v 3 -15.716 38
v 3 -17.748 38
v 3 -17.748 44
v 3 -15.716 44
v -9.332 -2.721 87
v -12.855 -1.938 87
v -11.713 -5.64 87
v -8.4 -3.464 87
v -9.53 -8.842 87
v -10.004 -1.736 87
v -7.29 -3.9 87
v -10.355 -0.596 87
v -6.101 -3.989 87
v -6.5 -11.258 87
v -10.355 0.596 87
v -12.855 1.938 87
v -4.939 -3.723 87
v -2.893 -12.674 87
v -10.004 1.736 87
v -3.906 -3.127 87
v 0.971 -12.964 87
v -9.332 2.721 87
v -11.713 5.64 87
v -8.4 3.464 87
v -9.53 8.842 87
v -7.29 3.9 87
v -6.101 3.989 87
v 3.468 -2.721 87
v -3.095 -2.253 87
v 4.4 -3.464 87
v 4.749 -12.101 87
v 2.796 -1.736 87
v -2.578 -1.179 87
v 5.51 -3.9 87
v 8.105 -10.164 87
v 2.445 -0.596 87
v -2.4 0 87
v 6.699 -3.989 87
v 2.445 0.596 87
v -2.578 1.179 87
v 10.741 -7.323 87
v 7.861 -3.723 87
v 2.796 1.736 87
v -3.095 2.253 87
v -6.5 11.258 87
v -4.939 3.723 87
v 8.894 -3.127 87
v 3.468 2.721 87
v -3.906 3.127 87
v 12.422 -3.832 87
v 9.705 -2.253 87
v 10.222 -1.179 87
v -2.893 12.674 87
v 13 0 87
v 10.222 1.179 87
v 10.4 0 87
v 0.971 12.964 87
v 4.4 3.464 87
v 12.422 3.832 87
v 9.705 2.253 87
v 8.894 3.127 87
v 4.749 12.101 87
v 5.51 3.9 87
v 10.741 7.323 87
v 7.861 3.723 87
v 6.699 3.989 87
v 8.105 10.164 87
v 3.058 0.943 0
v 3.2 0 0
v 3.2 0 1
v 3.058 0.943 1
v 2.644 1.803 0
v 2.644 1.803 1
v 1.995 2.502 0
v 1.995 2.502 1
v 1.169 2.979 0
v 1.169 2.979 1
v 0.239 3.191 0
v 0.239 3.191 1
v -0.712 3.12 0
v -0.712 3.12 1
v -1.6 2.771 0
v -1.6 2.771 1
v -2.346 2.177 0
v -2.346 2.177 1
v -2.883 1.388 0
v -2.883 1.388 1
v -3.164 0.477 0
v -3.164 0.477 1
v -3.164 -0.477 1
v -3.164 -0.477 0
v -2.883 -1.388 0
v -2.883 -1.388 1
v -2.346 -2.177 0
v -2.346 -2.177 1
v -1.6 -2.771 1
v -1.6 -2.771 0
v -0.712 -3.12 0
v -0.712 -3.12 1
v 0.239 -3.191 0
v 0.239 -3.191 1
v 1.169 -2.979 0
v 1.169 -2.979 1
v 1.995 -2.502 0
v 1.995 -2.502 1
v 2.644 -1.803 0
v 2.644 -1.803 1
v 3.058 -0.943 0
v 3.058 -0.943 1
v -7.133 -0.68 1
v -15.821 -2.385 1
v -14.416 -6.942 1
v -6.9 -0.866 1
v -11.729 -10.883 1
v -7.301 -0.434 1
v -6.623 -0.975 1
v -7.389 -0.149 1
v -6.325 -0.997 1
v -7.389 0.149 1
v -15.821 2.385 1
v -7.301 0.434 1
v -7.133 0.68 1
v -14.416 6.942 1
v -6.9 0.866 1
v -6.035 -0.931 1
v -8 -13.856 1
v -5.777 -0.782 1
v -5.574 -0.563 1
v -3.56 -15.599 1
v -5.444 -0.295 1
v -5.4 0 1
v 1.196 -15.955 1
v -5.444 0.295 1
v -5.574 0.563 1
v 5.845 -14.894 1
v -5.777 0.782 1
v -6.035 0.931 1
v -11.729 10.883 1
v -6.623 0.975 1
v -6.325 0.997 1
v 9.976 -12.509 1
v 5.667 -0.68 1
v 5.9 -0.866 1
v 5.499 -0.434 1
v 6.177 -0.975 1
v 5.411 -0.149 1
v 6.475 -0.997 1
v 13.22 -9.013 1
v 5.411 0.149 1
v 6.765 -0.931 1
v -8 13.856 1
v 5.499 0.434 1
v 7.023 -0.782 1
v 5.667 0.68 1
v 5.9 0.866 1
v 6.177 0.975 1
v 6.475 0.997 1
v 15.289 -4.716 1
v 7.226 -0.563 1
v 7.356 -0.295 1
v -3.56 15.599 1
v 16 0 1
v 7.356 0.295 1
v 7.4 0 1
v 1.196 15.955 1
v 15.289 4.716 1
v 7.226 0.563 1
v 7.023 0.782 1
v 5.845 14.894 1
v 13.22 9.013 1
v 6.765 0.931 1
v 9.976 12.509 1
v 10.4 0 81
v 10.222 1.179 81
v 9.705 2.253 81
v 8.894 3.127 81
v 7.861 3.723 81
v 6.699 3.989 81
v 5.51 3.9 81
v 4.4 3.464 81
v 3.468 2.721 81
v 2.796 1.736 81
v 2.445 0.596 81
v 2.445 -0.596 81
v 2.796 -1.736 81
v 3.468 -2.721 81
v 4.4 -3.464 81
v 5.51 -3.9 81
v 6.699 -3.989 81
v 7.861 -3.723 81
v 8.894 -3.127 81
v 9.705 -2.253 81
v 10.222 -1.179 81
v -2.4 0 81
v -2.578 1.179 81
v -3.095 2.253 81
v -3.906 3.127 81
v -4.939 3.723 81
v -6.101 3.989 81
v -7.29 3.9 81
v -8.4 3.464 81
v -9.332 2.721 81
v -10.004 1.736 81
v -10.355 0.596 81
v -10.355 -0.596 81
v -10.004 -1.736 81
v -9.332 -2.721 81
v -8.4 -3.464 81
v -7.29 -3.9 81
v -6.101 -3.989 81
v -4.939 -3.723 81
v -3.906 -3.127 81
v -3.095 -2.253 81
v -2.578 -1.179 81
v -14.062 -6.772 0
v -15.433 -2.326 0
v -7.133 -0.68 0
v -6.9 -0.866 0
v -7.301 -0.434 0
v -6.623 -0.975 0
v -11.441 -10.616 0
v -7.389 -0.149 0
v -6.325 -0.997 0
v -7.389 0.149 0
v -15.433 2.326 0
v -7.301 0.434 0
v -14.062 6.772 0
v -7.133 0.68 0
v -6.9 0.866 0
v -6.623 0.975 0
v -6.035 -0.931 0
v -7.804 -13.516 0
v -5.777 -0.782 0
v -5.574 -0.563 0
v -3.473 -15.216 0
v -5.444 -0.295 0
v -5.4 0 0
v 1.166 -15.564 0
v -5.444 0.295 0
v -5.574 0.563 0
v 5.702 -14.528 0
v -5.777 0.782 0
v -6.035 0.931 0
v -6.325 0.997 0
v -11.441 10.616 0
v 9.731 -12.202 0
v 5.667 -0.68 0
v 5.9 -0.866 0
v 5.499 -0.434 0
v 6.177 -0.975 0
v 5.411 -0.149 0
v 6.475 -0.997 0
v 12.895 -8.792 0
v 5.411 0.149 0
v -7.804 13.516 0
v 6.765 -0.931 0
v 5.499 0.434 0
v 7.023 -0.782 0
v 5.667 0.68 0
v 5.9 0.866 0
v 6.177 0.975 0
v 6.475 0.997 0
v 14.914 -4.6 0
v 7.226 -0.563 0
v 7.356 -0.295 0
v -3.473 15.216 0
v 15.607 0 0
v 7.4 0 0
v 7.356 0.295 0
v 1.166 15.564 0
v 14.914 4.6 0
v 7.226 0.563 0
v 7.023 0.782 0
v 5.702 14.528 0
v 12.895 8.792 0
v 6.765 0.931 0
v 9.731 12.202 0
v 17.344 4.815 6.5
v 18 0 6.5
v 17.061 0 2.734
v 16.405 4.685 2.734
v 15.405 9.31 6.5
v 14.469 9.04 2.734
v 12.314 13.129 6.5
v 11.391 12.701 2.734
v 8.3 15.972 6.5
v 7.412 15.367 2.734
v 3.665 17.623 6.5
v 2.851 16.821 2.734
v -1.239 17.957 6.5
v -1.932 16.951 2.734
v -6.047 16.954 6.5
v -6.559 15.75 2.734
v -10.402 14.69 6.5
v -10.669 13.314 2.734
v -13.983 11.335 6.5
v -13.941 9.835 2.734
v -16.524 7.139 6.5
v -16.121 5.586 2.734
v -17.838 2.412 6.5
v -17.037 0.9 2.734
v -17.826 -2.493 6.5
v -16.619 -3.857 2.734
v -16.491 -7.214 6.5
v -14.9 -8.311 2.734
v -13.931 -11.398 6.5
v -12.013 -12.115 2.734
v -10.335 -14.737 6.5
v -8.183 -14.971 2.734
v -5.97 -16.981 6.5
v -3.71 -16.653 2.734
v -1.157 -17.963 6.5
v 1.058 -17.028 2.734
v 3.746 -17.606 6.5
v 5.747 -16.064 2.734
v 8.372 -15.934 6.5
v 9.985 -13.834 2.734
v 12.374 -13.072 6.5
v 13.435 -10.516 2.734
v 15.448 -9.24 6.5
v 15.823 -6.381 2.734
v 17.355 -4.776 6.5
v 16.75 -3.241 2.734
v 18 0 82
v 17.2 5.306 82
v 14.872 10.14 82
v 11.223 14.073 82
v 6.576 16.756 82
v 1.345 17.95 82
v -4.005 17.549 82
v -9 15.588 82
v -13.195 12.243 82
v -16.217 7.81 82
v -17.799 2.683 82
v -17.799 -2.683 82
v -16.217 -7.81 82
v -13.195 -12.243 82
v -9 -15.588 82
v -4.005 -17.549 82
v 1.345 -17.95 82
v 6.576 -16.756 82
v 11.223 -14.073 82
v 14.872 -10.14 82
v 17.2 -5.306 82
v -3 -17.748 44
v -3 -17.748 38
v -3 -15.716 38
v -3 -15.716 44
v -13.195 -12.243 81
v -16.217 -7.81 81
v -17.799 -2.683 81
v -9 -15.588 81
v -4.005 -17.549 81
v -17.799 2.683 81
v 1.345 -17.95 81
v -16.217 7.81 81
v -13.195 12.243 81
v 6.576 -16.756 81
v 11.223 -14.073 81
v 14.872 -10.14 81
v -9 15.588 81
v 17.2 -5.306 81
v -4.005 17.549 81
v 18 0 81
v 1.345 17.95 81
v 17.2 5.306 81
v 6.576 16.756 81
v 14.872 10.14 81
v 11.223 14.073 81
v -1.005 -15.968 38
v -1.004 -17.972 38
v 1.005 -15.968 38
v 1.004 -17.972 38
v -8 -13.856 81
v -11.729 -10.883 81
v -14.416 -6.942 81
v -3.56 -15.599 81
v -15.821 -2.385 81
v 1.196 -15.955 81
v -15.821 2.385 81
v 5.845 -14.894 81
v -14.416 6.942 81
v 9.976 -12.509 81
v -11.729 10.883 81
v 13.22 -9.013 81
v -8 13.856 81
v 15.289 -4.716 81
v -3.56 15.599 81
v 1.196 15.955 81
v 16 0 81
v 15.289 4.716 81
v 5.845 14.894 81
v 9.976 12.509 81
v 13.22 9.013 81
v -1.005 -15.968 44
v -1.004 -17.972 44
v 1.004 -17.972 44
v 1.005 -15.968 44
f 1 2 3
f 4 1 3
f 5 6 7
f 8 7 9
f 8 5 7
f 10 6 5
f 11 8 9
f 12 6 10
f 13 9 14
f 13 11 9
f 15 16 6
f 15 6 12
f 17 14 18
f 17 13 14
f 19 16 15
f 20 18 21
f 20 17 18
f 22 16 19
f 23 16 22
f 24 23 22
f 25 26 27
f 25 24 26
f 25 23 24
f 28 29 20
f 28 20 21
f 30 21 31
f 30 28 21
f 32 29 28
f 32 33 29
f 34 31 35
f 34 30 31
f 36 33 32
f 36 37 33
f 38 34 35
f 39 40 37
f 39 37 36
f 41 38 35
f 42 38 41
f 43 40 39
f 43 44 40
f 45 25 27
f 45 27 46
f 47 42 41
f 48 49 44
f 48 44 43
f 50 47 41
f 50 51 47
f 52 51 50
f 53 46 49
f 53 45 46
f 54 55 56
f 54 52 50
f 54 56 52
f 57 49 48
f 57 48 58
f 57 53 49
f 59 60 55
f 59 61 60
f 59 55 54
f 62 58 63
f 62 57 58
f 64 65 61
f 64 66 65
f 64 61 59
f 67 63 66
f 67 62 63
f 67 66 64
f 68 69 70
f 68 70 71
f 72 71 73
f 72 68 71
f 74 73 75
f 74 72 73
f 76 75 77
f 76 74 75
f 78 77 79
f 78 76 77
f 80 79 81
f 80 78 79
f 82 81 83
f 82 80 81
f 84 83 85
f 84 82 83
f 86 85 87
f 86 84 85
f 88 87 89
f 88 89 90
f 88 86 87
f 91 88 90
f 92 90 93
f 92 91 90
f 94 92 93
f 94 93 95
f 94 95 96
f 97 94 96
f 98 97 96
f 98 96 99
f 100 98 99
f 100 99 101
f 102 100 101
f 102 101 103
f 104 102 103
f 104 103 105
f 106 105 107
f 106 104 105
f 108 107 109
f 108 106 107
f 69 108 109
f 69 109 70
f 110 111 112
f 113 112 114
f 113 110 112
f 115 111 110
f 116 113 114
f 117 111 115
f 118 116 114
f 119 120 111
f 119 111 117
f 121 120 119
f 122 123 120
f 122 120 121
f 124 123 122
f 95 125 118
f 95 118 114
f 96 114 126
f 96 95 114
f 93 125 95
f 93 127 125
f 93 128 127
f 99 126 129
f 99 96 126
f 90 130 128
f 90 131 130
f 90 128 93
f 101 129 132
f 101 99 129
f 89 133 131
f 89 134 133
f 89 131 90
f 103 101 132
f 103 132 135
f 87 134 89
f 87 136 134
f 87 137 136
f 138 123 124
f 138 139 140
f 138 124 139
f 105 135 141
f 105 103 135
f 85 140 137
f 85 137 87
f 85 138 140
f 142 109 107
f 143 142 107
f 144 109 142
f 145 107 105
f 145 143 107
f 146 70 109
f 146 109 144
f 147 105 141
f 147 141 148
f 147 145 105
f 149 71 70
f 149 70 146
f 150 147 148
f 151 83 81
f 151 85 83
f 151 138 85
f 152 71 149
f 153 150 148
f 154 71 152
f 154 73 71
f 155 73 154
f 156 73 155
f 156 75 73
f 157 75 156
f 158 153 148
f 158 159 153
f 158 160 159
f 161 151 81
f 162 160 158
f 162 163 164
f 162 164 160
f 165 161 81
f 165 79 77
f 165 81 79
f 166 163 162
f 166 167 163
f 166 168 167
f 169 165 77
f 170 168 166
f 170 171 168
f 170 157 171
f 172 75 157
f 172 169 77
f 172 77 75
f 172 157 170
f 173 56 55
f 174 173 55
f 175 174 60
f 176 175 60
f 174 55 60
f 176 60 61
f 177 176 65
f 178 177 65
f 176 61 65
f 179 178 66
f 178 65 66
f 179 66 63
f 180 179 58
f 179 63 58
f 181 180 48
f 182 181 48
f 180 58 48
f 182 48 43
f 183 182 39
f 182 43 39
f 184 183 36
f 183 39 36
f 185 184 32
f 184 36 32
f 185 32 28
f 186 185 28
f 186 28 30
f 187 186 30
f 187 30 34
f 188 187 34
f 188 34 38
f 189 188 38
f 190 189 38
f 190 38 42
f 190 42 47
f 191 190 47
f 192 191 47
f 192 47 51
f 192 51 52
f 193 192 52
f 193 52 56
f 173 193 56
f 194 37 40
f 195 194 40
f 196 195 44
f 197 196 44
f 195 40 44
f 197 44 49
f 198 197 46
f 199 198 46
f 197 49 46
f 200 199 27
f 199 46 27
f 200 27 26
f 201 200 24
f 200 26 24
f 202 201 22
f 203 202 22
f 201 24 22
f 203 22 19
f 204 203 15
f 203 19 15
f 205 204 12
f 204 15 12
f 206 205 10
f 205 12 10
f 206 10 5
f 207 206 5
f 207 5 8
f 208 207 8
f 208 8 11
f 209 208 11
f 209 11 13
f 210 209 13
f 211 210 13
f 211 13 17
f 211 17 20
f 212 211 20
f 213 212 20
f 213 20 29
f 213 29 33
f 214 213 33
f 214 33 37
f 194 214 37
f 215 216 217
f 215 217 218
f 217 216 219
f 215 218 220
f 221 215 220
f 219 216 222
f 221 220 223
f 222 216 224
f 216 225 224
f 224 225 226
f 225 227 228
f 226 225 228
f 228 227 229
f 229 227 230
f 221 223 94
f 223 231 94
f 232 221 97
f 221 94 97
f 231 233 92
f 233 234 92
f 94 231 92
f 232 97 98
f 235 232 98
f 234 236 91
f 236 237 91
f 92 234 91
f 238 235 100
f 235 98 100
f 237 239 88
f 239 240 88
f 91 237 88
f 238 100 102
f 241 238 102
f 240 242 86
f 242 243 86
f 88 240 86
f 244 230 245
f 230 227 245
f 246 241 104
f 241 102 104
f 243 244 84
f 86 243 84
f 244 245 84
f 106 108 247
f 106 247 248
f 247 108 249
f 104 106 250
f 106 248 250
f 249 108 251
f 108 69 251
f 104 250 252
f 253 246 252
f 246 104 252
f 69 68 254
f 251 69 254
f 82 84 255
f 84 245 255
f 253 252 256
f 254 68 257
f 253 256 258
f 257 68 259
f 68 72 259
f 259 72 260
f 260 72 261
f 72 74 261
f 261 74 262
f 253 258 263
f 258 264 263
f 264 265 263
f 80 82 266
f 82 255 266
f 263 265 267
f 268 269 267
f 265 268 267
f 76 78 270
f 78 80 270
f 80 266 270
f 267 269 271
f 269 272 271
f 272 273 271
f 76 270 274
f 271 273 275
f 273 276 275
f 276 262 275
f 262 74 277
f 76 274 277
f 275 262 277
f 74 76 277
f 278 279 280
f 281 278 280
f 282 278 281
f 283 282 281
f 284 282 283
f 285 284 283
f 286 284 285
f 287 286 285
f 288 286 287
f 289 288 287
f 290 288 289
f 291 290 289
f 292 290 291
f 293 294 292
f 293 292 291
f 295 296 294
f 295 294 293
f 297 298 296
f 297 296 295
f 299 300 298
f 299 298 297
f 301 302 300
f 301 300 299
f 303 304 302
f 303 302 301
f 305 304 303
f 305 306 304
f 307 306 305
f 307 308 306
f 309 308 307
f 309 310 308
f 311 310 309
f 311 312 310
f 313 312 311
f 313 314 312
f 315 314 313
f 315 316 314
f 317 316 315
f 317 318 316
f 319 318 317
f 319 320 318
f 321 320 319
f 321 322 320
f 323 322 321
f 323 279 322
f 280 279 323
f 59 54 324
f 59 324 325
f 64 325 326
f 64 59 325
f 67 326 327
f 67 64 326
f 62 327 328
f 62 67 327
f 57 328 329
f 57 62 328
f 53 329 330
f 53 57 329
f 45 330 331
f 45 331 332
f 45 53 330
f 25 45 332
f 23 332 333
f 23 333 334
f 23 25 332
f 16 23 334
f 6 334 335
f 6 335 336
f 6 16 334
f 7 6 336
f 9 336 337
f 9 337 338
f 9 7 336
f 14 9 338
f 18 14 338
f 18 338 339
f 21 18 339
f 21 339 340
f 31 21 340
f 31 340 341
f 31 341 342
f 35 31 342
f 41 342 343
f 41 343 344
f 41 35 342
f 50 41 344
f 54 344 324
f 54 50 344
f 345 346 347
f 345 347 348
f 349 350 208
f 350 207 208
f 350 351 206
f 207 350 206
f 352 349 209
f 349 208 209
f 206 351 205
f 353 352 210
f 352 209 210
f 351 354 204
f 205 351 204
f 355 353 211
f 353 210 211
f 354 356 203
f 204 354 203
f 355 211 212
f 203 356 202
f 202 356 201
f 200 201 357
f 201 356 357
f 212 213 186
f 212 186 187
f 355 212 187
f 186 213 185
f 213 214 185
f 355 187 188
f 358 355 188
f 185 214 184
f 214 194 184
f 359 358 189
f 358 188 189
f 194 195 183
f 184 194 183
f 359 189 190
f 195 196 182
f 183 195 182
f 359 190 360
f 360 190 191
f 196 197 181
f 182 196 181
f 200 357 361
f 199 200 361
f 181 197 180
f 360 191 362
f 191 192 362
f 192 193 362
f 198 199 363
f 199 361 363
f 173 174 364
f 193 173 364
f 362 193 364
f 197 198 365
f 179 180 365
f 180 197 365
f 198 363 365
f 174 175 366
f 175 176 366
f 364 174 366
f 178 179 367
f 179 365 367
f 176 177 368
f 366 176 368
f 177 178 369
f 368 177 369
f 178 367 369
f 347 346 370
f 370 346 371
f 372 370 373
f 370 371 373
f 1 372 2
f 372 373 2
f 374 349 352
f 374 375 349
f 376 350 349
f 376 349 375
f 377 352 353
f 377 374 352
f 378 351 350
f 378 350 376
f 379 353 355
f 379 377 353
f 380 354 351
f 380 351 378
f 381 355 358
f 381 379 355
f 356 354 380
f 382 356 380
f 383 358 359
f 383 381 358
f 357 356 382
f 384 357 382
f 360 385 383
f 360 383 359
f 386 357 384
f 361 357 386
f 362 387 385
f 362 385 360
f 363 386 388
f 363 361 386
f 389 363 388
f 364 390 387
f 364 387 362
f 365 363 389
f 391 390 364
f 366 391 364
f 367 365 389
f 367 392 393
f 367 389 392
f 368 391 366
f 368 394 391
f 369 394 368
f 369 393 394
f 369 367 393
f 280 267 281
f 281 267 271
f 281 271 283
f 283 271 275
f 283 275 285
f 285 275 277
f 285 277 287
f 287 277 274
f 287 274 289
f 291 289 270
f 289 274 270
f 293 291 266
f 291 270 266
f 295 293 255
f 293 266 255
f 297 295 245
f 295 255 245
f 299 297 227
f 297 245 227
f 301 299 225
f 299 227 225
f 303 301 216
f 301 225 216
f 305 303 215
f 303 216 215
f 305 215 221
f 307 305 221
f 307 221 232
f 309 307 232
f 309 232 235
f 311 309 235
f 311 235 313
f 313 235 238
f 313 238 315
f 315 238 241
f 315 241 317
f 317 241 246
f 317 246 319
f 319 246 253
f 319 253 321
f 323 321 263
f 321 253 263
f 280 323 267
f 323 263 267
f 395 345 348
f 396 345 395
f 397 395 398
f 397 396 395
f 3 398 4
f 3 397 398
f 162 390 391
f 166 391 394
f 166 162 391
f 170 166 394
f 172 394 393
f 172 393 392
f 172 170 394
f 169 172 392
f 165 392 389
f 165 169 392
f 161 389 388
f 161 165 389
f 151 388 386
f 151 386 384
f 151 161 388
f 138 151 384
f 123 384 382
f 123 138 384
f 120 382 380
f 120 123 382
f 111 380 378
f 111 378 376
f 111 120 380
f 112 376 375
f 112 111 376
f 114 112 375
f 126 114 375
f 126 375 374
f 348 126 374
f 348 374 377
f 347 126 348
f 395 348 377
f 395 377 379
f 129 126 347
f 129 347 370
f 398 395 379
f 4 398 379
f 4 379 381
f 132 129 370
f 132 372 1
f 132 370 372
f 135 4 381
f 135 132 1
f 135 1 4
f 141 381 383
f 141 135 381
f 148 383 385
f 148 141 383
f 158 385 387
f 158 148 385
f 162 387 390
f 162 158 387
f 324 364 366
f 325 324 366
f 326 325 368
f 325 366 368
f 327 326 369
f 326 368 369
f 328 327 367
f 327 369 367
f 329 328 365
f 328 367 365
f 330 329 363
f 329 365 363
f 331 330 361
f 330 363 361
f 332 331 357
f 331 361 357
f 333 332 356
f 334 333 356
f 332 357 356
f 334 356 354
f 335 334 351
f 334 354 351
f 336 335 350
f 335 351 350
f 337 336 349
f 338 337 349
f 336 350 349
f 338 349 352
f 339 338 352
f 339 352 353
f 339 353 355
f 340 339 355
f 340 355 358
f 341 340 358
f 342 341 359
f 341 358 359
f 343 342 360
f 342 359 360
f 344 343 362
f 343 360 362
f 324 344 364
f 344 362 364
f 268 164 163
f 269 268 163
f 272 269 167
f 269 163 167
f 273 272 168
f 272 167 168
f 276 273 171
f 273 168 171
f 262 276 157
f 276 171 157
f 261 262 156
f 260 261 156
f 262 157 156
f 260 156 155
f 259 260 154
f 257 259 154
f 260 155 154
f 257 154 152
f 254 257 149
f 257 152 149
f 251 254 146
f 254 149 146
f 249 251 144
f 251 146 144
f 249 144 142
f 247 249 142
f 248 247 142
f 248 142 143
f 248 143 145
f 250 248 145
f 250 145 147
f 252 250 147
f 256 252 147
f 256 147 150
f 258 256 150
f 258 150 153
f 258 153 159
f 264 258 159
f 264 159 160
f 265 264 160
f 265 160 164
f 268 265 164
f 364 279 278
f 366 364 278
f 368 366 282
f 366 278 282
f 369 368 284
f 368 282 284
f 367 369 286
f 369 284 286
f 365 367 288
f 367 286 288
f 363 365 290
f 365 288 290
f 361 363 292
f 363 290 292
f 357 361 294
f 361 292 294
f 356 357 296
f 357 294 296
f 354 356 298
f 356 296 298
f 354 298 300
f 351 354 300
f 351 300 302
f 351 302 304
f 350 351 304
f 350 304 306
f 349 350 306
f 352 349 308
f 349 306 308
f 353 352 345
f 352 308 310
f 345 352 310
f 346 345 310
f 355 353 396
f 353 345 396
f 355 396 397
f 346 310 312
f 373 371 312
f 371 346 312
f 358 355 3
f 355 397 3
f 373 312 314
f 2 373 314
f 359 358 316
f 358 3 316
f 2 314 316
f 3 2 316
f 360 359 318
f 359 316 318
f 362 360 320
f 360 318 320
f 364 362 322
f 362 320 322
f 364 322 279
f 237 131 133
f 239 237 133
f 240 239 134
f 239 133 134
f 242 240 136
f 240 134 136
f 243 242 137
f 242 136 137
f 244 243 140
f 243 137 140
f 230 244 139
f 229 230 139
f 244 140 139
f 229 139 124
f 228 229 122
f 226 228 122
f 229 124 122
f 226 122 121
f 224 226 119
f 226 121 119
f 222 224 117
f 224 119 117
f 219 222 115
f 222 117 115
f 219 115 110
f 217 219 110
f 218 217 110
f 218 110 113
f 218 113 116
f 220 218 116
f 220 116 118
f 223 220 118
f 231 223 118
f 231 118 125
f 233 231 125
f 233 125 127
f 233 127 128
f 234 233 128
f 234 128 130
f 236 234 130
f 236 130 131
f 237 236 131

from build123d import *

# Parameters (mm, degrees)
F0_R      = 18
F0_R_2    = 3.2
F1_DEPTH  = 1
F3_R      = 1
F4_DEPTH  = 25
F3_R_2    = 18
F3_R_3    = 16
F5_DEPTH  = 80
F6_W      = 6
F6_H      = 5.9999996329
F7_DEPTH  = 25
F8_R      = 18
F8_R_2    = 16
F9_DEPTH  = 6
F10_R     = 4
F11_DEPTH = 25
F12_SIZE  = 5
F13_SIZE2 = 2.3926924425
F13_SIZE  = 4.5
F14_SIZE  = 2


with BuildPart() as f1:
    # F0 (on Top) → F1 (new body)
    with BuildSketch(Plane.XY):
        Circle(F0_R)
        Circle(F0_R_2, mode=Mode.SUBTRACT)
    extrude(amount=F1_DEPTH)

    # F3 (on face) → F4 (cut)
    with BuildSketch(Plane.XY.offset(1)):
        with Locations((-6.4, 0)):
            Circle(F3_R)
        with Locations((6.4, 0)):
            Circle(F3_R)
    extrude(amount=-F4_DEPTH, mode=Mode.SUBTRACT)

    # F3 (on face) → F5 (join)
    with BuildSketch(Plane.XY.offset(1)):
        Circle(F3_R_2)
        Circle(F3_R_3, mode=Mode.SUBTRACT)
    extrude(amount=F5_DEPTH)

    # F6 (on offset) → F7 (cut)
    with BuildSketch(Plane.XZ.offset(18)):
        with Locations((0, 40.9999998165)):
            Rectangle(F6_W, F6_H)
    extrude(amount=-F7_DEPTH, mode=Mode.SUBTRACT)

    # F13
    f13_edges = [f1.edges().sort_by_distance(p)[0] for p in [
        (-18, 0, 0),
    ]]
    f13_side = f1.faces().sort_by_distance((-18, 0, 40.5))[0]
    chamfer(f13_edges, length=F13_SIZE, length2=F13_SIZE2, reference=f13_side)

    # F14
    f14_edges = [f1.edges().sort_by_distance(p)[0] for p in [
        (-18, 0, 4.5),
    ]]
    chamfer(f14_edges, length=F14_SIZE)


with BuildPart() as f9:
    # F8 (on face) → F9 (new body)
    with BuildSketch(Plane.XY.offset(81)):
        Circle(F8_R)
        Circle(F8_R_2, mode=Mode.SUBTRACT)
        Circle(F8_R_2)
    extrude(amount=F9_DEPTH)

    # F10 (on face) → F11 (cut)
    with BuildSketch(Plane.XY.offset(87)):
        with Locations((-6.4, 0)):
            Circle(F10_R)
        with Locations((6.4, 0)):
            Circle(F10_R)
    extrude(amount=-F11_DEPTH, mode=Mode.SUBTRACT)

    # F12
    f12_edges = [f9.edges().sort_by_distance(p)[0] for p in [
        (-18, 0, 87),
    ]]
    chamfer(f12_edges, length=F12_SIZE)


solid = Compound([f1.part, f9.part])
